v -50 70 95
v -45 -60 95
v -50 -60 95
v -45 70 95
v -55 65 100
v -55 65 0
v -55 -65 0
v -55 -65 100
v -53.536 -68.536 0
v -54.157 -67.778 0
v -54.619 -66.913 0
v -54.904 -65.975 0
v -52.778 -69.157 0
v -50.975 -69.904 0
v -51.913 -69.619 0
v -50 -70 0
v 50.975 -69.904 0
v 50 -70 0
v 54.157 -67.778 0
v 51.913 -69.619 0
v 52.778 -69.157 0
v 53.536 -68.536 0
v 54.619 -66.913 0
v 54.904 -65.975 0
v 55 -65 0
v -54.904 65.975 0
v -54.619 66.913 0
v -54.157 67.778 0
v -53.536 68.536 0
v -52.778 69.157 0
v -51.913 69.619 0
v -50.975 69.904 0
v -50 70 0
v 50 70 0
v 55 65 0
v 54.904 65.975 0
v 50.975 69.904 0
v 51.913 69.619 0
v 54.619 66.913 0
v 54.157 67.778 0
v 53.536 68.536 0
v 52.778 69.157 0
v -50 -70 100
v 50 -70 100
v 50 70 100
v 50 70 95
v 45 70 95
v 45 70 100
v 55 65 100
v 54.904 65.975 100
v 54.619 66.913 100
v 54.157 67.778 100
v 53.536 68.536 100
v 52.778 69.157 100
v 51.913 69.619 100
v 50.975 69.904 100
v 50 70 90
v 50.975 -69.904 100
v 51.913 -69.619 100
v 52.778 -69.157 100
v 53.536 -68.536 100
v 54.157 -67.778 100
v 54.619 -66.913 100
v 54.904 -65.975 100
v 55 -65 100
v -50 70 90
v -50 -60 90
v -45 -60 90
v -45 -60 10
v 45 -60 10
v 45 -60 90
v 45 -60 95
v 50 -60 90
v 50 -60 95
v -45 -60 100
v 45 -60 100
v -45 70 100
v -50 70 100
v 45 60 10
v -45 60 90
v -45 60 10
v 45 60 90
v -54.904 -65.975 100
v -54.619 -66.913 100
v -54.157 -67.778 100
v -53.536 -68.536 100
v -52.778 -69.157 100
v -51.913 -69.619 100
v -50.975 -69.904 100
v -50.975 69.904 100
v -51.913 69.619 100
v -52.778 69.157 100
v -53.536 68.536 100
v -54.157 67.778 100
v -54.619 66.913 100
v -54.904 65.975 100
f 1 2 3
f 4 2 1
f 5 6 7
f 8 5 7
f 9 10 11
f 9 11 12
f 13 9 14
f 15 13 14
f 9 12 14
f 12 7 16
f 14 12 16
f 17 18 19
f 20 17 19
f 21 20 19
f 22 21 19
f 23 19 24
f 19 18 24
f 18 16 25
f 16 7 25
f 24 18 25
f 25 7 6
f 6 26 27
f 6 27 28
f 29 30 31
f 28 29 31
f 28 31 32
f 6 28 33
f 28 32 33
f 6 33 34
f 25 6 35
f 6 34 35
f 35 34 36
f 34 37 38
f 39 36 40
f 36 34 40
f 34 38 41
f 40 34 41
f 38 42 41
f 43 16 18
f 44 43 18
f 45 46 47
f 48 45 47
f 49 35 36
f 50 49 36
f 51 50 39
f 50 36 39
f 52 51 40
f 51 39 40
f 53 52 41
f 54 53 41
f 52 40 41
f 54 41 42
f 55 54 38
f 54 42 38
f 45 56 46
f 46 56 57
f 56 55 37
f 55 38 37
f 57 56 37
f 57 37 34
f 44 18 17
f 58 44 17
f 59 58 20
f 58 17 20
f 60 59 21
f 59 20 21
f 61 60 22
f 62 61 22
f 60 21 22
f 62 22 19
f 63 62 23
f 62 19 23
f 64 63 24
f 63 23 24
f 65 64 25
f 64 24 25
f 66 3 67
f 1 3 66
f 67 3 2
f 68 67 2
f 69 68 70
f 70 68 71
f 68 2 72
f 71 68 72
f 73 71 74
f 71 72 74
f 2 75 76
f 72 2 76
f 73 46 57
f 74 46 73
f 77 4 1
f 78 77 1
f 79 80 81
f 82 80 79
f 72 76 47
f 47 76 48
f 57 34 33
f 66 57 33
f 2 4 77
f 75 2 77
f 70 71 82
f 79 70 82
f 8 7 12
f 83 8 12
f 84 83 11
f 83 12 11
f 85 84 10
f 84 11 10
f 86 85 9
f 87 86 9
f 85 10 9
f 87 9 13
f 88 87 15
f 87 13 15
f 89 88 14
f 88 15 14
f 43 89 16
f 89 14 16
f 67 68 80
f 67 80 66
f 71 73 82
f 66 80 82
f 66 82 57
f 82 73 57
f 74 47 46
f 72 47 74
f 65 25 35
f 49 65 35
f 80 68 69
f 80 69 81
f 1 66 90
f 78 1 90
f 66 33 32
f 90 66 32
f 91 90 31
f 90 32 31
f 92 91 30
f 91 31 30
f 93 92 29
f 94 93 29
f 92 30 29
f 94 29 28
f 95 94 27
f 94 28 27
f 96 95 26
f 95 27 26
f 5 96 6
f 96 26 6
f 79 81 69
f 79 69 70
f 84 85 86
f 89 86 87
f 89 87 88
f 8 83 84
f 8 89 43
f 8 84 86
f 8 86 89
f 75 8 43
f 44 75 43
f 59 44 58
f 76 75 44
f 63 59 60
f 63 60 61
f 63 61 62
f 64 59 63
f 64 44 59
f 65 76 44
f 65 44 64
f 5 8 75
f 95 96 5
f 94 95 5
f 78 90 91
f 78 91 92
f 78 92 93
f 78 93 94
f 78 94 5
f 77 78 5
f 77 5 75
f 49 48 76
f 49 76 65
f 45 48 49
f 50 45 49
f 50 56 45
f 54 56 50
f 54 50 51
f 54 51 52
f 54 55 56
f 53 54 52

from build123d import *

# Parameters (mm, degrees)
F1_DEPTH  = 100
F2_W      = 90
F2_H      = 120
F3_DEPTH  = 90
F4_W      = 120
F4_H      = 5
F5_DEPTH  = 5
F6_W      = 120
F6_H      = 5
F7_DEPTH  = 5
F8_W      = 90
F8_H      = 10
F9_DEPTH  = 10
F10_W     = 10
F10_H     = 5
F11_DEPTH = 5
F12_W     = 10
F12_H     = 5
F13_DEPTH = 5


with BuildPart() as f1:
    # F0 (on Top) → F1 (new body)
    with BuildSketch(Plane.XY):
        with BuildLine():
            Line((-50, -70), (50, -70))
            ThreePointArc((50, -70), (53.535534, -68.535534), (55, -65))
            Line((55, -65), (55, 65))
            ThreePointArc((55, 65), (53.535534, 68.535534), (50, 70))
            Line((50, 70), (-50, 70))
            ThreePointArc((-50, 70), (-53.535534, 68.535534), (-55, 65))
            Line((-55, 65), (-55, -65))
            ThreePointArc((-55, -65), (-53.535534, -68.535534), (-50, -70))
        make_face()
    extrude(amount=F1_DEPTH)

    # F2 (on face) → F3 (cut)
    with BuildSketch(Plane.XY.offset(100)):
        Rectangle(F2_W, F2_H)
    extrude(amount=-F3_DEPTH, mode=Mode.SUBTRACT)

    # F4 (on face) → F5 (cut)
    with BuildSketch(Plane(origin=(45, 0, 0), x_dir=(0, -1, 0), z_dir=(-1, 0, 0))):
        with Locations((0, 92.5)):
            Rectangle(F4_W, F4_H)
    extrude(amount=-F5_DEPTH, mode=Mode.SUBTRACT)

    # F6 (on face) → F7 (cut)
    with BuildSketch(Plane.YZ.offset(-45)):
        with Locations((0, 92.5)):
            Rectangle(F6_W, F6_H)
    extrude(amount=-F7_DEPTH, mode=Mode.SUBTRACT)

    # F8 (on face) → F9 (cut)
    with BuildSketch(Plane.XZ.offset(-60)):
        with Locations((0, 95)):
            Rectangle(F8_W, F8_H)
    extrude(amount=-F9_DEPTH, mode=Mode.SUBTRACT)

    # F10 (on face) → F11 (cut)
    with BuildSketch(Plane(origin=(45, 0, 0), x_dir=(0, -1, 0), z_dir=(-1, 0, 0))):
        with Locations((-65, 92.5)):
            Rectangle(F10_W, F10_H)
    extrude(amount=-F11_DEPTH, mode=Mode.SUBTRACT)

    # F12 (on face) → F13 (cut)
    with BuildSketch(Plane.YZ.offset(-45)):
        with Locations((65, 92.5)):
            Rectangle(F12_W, F12_H)
    extrude(amount=-F13_DEPTH, mode=Mode.SUBTRACT)


solid = f1.part
